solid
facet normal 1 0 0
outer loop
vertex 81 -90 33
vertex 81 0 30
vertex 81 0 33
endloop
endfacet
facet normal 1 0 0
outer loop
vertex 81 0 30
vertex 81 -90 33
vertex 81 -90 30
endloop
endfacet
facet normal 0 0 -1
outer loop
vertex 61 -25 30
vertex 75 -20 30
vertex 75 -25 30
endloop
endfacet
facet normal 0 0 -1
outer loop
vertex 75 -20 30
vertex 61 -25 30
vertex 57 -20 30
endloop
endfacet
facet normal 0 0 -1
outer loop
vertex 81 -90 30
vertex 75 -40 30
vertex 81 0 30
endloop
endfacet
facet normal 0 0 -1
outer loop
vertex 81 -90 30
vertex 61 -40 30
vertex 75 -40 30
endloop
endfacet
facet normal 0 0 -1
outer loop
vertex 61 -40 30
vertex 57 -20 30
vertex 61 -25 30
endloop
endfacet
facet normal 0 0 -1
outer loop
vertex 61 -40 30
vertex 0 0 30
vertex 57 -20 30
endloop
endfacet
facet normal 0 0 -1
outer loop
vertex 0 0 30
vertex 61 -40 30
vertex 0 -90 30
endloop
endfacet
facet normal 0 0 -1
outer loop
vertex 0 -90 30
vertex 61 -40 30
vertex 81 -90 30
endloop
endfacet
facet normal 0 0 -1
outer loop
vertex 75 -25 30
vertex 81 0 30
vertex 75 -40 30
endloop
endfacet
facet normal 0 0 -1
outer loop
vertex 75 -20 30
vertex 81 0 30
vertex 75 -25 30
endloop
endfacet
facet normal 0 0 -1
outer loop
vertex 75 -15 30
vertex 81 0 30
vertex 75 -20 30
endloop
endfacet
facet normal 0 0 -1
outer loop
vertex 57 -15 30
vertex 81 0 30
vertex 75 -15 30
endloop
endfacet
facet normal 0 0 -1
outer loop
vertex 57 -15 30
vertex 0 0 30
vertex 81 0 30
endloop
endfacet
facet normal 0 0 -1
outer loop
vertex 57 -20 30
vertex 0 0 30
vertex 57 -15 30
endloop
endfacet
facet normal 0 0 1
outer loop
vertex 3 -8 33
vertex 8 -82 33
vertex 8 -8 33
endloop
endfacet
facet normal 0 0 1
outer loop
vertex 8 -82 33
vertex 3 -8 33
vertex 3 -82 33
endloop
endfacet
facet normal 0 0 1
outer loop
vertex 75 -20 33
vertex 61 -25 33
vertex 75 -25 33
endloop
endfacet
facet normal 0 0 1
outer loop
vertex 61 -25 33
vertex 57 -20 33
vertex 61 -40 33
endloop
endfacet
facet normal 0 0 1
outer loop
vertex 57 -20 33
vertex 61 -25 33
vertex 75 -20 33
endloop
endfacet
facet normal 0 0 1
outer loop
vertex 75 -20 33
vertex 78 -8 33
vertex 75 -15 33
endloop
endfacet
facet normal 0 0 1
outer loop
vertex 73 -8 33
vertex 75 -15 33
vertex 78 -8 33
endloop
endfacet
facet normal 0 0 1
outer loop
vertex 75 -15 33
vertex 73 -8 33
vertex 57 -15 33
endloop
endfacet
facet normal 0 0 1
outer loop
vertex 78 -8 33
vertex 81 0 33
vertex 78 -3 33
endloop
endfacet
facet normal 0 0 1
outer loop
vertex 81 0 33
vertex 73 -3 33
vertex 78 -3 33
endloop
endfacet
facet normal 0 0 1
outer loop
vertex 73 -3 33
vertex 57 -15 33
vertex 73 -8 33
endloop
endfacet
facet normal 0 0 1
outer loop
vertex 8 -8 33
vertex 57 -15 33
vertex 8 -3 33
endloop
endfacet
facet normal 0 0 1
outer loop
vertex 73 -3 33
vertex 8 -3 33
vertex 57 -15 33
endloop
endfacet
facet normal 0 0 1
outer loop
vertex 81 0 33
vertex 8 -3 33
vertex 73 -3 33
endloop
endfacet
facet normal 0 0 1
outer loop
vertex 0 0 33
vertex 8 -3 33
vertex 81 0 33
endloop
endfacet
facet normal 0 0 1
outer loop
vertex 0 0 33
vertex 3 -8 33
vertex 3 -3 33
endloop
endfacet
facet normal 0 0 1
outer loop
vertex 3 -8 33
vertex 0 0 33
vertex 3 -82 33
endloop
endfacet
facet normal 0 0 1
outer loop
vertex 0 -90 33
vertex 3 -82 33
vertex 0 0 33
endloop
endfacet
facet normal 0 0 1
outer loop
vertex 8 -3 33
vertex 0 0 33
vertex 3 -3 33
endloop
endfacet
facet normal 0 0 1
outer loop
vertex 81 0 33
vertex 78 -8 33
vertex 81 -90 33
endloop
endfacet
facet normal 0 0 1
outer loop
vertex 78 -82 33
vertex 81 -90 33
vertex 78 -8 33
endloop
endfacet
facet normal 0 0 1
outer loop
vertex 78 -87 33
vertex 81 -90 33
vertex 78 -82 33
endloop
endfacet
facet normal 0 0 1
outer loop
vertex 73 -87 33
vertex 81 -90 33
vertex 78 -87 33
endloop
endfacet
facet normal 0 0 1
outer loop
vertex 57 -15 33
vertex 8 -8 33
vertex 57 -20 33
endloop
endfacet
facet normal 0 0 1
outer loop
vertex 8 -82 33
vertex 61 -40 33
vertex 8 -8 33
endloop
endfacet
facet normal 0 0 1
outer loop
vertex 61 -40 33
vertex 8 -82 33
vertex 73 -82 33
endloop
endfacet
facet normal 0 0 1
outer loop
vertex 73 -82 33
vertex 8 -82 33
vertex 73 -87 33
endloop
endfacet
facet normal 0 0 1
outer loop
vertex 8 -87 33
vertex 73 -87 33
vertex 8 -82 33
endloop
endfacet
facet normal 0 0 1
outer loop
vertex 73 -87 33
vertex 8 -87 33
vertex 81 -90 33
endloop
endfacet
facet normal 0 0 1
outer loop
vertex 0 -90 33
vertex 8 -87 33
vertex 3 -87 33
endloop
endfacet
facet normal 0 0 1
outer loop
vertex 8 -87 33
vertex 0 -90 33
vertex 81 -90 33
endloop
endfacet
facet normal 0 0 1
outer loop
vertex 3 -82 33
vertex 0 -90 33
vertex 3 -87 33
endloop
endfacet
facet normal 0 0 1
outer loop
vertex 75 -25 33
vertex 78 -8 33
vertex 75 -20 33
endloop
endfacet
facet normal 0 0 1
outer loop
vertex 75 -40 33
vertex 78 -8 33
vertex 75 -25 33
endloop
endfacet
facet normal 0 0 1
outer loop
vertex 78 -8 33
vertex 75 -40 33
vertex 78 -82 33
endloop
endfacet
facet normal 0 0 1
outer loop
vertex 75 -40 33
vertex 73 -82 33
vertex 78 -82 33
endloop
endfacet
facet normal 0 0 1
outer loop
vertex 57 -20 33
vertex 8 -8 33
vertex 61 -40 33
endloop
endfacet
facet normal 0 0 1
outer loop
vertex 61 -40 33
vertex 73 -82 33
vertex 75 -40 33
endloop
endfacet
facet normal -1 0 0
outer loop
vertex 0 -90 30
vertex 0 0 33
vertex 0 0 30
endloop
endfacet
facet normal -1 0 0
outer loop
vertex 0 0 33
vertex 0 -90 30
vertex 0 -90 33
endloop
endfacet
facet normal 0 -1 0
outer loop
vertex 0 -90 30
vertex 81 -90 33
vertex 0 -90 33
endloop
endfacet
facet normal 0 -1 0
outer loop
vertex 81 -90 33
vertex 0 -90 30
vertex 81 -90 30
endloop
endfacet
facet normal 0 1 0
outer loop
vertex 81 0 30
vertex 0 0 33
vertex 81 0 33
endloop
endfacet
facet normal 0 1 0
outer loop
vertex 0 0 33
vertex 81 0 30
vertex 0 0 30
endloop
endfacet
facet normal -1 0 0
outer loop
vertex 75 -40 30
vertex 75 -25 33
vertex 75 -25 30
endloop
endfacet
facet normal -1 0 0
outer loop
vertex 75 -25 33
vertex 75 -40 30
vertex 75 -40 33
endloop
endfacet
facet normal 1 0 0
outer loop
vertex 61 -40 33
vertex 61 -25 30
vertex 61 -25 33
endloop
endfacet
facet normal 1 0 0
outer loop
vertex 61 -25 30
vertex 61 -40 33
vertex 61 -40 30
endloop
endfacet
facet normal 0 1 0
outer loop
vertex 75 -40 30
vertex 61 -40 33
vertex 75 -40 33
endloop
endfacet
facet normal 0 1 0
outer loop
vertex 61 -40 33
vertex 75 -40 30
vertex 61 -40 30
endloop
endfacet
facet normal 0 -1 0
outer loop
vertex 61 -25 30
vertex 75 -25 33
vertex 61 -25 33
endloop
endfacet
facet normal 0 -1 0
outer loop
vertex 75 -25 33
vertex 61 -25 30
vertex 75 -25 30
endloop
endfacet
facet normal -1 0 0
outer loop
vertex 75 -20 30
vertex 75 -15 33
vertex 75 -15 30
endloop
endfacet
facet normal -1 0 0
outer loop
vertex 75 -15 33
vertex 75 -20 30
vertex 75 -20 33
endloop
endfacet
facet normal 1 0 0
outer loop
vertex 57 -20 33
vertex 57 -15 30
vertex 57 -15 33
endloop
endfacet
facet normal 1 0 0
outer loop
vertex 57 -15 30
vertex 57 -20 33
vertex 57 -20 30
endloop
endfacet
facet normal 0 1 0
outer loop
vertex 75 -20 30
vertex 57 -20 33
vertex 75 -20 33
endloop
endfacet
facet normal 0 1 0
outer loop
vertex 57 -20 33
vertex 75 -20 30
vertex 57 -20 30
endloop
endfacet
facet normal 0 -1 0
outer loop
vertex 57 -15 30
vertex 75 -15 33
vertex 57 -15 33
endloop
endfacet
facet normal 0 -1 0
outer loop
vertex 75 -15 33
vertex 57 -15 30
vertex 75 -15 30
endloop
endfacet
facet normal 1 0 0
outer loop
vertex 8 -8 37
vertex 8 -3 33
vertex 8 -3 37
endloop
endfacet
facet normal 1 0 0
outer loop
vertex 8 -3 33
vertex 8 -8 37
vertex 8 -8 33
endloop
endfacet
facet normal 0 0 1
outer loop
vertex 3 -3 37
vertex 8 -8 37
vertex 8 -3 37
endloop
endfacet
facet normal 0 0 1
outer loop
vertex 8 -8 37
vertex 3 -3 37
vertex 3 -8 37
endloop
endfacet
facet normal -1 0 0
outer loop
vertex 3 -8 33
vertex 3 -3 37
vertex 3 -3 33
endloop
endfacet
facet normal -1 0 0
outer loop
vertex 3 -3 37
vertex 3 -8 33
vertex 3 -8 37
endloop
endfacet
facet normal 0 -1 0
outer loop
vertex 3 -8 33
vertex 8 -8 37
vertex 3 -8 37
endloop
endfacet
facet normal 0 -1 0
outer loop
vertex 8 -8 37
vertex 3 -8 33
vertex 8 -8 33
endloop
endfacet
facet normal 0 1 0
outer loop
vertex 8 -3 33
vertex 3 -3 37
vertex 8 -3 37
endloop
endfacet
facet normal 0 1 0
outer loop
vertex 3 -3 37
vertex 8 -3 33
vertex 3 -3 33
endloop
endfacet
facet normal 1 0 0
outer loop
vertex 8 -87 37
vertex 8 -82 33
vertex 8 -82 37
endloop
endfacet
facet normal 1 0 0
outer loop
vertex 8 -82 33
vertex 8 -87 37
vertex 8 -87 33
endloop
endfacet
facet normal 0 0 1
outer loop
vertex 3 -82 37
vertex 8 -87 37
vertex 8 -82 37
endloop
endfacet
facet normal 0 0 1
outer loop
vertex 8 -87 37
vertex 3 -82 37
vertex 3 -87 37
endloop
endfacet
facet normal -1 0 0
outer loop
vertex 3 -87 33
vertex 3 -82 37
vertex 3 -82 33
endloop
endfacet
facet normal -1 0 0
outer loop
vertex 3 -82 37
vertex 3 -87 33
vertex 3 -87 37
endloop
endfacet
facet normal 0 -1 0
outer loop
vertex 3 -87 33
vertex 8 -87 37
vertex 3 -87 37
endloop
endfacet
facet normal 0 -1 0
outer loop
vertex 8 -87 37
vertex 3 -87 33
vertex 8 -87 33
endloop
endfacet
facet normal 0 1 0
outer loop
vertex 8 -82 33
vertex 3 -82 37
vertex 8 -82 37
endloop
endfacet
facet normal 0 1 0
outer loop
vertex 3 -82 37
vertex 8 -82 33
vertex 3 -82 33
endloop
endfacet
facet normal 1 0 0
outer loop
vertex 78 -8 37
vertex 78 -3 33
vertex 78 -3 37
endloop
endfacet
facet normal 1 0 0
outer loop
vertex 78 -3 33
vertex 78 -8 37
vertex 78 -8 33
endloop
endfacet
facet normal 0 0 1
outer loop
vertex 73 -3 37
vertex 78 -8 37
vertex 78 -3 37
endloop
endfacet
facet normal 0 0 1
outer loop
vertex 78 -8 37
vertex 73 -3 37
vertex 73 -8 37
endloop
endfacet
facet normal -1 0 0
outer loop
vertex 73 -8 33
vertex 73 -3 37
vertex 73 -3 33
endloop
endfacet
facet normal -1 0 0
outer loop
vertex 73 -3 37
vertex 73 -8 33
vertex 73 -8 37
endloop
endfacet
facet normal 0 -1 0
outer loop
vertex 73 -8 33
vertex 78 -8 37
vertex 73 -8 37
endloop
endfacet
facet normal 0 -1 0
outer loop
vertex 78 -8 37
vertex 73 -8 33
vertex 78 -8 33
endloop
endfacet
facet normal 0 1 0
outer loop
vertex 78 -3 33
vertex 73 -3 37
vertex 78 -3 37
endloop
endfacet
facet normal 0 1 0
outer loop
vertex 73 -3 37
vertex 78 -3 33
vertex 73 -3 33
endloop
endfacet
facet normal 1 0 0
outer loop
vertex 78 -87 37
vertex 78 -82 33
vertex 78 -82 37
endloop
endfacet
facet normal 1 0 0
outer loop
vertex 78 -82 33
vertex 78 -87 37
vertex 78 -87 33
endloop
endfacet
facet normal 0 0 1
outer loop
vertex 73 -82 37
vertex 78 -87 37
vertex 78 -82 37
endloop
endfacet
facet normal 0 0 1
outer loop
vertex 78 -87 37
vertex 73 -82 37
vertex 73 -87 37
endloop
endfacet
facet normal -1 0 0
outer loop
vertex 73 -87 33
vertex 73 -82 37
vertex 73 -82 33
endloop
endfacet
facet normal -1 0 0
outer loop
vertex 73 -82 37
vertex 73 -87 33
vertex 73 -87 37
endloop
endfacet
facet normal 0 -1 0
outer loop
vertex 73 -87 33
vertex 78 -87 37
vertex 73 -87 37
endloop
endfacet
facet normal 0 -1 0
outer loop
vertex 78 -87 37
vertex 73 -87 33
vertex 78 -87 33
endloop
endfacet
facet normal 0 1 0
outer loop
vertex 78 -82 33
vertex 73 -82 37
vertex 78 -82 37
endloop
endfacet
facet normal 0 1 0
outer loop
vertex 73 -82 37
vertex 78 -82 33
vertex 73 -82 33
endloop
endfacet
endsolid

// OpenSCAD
//!OpenSCAD
/*
* 2024.01.13 Added an IR intervalometer for my EOS-M.
* 
* This bigger version of the box takes the same size circuit board 
* as the original but allows use of my old Canon EOS-M by including
* space for the optional manual focus buttons and the Intervalometer switch.
*/
quality=128;

//=======================
module Hole(diam){
    cylinder(h=20,d=diam,$fn=quality);
}

//=======================
module fixings(){
    translate([7,7,-1]){
        Hole(3.6);
    }

    translate([7,48,-1]){
        Hole(3.6);
    }
    
    //USB
    translate([-1,25,10]){
        cube([8,11,8]);
    }
    
    //12v power
    translate([-1,15,20]){
        rotate([0,90,0]){
            Hole(6);
        }
    }
    
    // holes for manual focus buttons
    translate([40,95,15]){
        rotate([90,0,0]){
            Hole(6.6);
        }
    }
    translate([60,95,15]){
        rotate([90,0,0]){
            Hole(6.6);
        }
    }
    
    // hole for intervalometer switch
    translate([-5,65,15]){
        rotate([0,90,0]){
            Hole(6.6);
        }
    }

}


//=======================
module Lid(){

    difference(){
        cube([81,90,3]);
        // hole for heatsink
        translate([61,25,-1]){
            cube([14,15,6]);
        }
        // hole for & intervalometer motor cables 
        translate([57,15,-1]){
            cube([18,5,6]);
        }
        
    }
    //corner blocks
    translate([3,3,-4]){
        cube([5,5,5]);
    }
    translate([3,82,-4]){
        cube([5,5,5]);
    }
    translate([73,3,-4]){
        cube([5,5,5]);
    }
    translate([73,82,-4]){
        cube([5,5,5]);
    }


}

//=======================
module Base(){
    difference(){
        cube([81,90,30]);
        translate([3,3,3]){
            // original cube([75,50,40]);
            cube([75,84,40]);
        }
    }
    //divider blocks same width as original box
    //to steady circuit board
    translate([0,53,3]){
        translate([3,0,0]){
            cube([5,3,8]);
        }
        translate([73,0,0]){
            cube([5,3,8]);
        }
    }
    
    //corner ledges
    //bottom left
    translate([3,3,3]){
        cube([8,8,5]);
    }
    //top left
    translate([3,44,3]){
        cube([8,8,5]);
    }
    //bottom right
    translate([73,18,3]){
        cube([5,5,5]);
    }
    //top right
    translate([73,41,3]){
        cube([5,5,5]);
    }
     
}

printRotation = 180;
// ---------- Lid ----------
translate([0,0,33]){
    rotate([printRotation,0,0]){
        Lid();
    }
}


// ---------- Base part ----------
/*
difference(){
    Base();
    fixings();
}
*/
